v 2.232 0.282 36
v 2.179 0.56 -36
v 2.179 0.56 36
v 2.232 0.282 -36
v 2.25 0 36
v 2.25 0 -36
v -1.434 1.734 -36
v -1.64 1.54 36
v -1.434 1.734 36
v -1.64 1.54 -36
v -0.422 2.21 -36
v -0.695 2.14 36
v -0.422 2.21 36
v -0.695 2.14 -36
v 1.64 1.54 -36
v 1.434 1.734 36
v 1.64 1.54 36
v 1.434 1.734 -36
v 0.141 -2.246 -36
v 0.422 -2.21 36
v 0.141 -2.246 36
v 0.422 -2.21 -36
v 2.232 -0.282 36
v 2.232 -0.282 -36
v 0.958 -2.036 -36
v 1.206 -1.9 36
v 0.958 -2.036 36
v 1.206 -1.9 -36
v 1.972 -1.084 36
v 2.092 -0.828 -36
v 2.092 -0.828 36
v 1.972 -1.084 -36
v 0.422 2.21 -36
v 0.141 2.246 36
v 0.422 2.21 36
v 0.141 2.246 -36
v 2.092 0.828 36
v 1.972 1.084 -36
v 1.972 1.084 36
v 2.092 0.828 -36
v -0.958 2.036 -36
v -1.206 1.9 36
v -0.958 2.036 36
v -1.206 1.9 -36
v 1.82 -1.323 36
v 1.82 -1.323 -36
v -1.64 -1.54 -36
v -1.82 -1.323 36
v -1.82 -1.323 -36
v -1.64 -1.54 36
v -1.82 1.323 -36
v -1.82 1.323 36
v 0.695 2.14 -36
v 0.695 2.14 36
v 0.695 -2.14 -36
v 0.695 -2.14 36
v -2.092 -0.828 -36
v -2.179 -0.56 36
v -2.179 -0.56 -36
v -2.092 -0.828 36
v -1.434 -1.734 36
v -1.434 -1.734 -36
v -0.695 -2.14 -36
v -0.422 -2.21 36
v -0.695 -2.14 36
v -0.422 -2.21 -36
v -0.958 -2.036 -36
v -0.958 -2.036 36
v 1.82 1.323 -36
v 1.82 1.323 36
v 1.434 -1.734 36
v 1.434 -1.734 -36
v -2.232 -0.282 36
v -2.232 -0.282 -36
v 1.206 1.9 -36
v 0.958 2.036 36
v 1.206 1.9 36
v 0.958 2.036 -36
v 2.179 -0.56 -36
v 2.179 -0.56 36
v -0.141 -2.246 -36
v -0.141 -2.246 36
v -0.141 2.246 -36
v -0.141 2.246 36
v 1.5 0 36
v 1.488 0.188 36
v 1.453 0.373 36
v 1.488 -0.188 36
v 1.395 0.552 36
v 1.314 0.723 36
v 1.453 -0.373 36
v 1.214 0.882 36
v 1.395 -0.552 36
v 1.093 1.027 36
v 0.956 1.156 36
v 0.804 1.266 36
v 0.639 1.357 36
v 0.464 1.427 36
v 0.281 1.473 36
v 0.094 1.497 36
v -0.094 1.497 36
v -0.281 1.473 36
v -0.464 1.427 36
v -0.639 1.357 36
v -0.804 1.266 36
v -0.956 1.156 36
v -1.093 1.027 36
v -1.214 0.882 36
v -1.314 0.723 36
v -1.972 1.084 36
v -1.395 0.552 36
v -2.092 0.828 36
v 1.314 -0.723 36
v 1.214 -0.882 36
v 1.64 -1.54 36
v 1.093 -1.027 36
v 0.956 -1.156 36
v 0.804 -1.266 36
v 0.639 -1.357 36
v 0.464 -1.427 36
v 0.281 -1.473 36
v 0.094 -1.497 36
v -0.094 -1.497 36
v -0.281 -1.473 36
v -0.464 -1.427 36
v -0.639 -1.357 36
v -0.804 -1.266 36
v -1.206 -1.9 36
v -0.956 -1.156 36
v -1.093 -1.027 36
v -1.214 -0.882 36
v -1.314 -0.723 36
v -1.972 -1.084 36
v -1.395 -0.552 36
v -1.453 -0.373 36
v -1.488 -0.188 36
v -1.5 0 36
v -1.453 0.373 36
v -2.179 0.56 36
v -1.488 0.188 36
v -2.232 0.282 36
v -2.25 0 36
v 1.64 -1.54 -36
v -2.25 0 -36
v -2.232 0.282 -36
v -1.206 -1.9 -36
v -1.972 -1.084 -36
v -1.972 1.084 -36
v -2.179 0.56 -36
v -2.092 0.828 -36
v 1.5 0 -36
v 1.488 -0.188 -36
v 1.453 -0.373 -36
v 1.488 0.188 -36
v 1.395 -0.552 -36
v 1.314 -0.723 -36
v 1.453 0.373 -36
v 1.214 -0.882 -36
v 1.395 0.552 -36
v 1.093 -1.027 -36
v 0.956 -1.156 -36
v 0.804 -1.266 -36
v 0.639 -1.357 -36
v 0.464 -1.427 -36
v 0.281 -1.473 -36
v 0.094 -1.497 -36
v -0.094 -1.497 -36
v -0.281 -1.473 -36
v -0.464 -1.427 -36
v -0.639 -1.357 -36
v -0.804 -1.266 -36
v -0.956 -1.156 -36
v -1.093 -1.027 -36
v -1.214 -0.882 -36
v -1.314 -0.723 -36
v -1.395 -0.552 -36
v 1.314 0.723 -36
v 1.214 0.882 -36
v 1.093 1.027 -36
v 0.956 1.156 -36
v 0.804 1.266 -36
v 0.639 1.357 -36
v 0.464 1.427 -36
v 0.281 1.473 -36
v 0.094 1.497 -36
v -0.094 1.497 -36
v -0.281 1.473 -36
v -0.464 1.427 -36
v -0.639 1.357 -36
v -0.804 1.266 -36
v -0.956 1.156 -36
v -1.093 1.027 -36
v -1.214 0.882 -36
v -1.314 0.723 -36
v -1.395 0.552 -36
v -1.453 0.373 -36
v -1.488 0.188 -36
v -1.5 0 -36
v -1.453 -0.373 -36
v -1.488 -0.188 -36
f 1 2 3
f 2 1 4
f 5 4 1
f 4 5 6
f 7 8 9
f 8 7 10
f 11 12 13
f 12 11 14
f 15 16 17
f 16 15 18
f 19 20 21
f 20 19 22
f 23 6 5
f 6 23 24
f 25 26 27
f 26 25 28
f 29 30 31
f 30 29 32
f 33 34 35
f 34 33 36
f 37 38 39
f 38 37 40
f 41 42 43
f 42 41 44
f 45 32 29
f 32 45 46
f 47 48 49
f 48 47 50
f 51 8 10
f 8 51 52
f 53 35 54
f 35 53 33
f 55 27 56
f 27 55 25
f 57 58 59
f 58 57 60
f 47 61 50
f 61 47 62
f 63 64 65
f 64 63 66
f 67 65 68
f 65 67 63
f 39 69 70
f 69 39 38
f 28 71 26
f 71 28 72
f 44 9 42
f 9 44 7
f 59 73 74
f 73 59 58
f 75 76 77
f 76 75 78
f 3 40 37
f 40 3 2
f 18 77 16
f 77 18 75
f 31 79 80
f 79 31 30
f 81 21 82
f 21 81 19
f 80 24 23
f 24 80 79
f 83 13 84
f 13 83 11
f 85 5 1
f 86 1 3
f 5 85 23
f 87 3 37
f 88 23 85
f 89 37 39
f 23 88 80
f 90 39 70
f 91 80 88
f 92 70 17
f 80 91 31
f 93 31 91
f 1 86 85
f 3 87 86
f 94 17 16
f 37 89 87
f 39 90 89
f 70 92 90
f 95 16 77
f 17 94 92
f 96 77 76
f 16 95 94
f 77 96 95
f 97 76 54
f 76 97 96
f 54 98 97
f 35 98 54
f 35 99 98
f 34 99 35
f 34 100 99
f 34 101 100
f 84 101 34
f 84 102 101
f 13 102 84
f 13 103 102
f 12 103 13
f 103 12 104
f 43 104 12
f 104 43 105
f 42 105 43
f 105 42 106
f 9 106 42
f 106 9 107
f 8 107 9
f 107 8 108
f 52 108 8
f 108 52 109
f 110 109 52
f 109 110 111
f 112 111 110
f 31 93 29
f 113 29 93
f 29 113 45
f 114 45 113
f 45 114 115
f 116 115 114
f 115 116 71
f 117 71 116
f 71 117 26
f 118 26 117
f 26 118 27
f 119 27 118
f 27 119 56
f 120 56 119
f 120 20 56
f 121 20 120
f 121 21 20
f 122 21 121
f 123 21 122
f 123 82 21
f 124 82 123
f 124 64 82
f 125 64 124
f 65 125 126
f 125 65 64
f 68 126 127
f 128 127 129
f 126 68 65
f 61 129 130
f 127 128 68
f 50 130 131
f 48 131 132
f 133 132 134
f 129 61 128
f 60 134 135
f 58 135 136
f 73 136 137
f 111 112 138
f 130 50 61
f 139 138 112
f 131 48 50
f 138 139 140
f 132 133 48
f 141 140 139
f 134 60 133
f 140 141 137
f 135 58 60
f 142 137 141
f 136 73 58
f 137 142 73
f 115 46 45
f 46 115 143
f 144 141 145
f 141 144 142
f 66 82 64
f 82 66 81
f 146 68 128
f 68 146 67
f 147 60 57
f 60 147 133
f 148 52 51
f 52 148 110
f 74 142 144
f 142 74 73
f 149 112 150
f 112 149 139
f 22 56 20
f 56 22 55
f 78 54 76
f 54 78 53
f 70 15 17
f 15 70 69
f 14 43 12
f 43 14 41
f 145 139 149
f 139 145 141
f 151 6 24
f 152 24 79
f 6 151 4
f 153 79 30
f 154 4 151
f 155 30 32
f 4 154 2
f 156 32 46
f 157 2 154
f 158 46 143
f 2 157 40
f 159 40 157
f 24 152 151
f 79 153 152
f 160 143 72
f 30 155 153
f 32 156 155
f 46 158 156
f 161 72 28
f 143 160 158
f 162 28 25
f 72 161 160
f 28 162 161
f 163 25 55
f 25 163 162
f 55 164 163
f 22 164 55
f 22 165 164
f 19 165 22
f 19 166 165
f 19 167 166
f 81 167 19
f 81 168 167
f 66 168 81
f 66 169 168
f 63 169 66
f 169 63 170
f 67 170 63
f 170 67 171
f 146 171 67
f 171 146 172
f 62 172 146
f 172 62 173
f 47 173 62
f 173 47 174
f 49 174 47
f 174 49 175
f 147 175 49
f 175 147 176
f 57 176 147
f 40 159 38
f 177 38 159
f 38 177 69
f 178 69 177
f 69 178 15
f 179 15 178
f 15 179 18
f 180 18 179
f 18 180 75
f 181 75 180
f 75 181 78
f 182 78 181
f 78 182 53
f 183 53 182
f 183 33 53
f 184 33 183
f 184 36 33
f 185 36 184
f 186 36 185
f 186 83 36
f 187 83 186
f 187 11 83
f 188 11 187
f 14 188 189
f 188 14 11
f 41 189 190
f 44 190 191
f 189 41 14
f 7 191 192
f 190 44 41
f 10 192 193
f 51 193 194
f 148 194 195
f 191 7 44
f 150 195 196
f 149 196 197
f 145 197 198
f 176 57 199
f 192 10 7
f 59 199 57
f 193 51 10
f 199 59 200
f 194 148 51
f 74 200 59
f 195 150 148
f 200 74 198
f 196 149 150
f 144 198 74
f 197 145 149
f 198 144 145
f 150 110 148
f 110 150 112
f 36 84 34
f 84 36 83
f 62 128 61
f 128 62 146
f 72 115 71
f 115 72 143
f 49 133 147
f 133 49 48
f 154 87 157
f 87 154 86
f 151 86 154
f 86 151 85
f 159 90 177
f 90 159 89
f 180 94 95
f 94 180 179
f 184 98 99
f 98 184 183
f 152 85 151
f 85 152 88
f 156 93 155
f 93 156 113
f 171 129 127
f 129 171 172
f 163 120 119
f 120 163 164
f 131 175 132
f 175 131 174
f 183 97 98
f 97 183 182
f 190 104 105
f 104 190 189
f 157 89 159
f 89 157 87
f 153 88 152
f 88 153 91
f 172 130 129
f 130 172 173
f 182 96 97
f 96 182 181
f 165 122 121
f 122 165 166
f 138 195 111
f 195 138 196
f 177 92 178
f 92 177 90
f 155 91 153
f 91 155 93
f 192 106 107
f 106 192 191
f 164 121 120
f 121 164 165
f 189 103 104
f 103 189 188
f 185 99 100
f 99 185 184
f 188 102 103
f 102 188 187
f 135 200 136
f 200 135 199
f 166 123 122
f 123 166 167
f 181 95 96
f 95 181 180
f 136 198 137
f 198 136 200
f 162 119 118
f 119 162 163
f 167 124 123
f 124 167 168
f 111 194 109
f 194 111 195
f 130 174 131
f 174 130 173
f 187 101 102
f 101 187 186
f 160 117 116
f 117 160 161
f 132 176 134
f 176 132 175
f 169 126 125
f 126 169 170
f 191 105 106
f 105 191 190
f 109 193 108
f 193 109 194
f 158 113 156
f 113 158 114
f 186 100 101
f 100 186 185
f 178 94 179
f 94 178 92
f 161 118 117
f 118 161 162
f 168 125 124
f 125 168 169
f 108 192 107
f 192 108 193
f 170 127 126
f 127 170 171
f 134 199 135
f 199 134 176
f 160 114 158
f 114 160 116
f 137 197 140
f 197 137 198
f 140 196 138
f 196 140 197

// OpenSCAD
$fn = 50;


difference() {
	union() {
		translate(v = [0, 0, -36.0000000000]) {
			cylinder(h = 72, r = 2.2500000000);
		}
	}
	union() {
		translate(v = [0, 0, -100.0000000000]) {
			cylinder(h = 200, r = 1.5000000000);
		}
	}
}
